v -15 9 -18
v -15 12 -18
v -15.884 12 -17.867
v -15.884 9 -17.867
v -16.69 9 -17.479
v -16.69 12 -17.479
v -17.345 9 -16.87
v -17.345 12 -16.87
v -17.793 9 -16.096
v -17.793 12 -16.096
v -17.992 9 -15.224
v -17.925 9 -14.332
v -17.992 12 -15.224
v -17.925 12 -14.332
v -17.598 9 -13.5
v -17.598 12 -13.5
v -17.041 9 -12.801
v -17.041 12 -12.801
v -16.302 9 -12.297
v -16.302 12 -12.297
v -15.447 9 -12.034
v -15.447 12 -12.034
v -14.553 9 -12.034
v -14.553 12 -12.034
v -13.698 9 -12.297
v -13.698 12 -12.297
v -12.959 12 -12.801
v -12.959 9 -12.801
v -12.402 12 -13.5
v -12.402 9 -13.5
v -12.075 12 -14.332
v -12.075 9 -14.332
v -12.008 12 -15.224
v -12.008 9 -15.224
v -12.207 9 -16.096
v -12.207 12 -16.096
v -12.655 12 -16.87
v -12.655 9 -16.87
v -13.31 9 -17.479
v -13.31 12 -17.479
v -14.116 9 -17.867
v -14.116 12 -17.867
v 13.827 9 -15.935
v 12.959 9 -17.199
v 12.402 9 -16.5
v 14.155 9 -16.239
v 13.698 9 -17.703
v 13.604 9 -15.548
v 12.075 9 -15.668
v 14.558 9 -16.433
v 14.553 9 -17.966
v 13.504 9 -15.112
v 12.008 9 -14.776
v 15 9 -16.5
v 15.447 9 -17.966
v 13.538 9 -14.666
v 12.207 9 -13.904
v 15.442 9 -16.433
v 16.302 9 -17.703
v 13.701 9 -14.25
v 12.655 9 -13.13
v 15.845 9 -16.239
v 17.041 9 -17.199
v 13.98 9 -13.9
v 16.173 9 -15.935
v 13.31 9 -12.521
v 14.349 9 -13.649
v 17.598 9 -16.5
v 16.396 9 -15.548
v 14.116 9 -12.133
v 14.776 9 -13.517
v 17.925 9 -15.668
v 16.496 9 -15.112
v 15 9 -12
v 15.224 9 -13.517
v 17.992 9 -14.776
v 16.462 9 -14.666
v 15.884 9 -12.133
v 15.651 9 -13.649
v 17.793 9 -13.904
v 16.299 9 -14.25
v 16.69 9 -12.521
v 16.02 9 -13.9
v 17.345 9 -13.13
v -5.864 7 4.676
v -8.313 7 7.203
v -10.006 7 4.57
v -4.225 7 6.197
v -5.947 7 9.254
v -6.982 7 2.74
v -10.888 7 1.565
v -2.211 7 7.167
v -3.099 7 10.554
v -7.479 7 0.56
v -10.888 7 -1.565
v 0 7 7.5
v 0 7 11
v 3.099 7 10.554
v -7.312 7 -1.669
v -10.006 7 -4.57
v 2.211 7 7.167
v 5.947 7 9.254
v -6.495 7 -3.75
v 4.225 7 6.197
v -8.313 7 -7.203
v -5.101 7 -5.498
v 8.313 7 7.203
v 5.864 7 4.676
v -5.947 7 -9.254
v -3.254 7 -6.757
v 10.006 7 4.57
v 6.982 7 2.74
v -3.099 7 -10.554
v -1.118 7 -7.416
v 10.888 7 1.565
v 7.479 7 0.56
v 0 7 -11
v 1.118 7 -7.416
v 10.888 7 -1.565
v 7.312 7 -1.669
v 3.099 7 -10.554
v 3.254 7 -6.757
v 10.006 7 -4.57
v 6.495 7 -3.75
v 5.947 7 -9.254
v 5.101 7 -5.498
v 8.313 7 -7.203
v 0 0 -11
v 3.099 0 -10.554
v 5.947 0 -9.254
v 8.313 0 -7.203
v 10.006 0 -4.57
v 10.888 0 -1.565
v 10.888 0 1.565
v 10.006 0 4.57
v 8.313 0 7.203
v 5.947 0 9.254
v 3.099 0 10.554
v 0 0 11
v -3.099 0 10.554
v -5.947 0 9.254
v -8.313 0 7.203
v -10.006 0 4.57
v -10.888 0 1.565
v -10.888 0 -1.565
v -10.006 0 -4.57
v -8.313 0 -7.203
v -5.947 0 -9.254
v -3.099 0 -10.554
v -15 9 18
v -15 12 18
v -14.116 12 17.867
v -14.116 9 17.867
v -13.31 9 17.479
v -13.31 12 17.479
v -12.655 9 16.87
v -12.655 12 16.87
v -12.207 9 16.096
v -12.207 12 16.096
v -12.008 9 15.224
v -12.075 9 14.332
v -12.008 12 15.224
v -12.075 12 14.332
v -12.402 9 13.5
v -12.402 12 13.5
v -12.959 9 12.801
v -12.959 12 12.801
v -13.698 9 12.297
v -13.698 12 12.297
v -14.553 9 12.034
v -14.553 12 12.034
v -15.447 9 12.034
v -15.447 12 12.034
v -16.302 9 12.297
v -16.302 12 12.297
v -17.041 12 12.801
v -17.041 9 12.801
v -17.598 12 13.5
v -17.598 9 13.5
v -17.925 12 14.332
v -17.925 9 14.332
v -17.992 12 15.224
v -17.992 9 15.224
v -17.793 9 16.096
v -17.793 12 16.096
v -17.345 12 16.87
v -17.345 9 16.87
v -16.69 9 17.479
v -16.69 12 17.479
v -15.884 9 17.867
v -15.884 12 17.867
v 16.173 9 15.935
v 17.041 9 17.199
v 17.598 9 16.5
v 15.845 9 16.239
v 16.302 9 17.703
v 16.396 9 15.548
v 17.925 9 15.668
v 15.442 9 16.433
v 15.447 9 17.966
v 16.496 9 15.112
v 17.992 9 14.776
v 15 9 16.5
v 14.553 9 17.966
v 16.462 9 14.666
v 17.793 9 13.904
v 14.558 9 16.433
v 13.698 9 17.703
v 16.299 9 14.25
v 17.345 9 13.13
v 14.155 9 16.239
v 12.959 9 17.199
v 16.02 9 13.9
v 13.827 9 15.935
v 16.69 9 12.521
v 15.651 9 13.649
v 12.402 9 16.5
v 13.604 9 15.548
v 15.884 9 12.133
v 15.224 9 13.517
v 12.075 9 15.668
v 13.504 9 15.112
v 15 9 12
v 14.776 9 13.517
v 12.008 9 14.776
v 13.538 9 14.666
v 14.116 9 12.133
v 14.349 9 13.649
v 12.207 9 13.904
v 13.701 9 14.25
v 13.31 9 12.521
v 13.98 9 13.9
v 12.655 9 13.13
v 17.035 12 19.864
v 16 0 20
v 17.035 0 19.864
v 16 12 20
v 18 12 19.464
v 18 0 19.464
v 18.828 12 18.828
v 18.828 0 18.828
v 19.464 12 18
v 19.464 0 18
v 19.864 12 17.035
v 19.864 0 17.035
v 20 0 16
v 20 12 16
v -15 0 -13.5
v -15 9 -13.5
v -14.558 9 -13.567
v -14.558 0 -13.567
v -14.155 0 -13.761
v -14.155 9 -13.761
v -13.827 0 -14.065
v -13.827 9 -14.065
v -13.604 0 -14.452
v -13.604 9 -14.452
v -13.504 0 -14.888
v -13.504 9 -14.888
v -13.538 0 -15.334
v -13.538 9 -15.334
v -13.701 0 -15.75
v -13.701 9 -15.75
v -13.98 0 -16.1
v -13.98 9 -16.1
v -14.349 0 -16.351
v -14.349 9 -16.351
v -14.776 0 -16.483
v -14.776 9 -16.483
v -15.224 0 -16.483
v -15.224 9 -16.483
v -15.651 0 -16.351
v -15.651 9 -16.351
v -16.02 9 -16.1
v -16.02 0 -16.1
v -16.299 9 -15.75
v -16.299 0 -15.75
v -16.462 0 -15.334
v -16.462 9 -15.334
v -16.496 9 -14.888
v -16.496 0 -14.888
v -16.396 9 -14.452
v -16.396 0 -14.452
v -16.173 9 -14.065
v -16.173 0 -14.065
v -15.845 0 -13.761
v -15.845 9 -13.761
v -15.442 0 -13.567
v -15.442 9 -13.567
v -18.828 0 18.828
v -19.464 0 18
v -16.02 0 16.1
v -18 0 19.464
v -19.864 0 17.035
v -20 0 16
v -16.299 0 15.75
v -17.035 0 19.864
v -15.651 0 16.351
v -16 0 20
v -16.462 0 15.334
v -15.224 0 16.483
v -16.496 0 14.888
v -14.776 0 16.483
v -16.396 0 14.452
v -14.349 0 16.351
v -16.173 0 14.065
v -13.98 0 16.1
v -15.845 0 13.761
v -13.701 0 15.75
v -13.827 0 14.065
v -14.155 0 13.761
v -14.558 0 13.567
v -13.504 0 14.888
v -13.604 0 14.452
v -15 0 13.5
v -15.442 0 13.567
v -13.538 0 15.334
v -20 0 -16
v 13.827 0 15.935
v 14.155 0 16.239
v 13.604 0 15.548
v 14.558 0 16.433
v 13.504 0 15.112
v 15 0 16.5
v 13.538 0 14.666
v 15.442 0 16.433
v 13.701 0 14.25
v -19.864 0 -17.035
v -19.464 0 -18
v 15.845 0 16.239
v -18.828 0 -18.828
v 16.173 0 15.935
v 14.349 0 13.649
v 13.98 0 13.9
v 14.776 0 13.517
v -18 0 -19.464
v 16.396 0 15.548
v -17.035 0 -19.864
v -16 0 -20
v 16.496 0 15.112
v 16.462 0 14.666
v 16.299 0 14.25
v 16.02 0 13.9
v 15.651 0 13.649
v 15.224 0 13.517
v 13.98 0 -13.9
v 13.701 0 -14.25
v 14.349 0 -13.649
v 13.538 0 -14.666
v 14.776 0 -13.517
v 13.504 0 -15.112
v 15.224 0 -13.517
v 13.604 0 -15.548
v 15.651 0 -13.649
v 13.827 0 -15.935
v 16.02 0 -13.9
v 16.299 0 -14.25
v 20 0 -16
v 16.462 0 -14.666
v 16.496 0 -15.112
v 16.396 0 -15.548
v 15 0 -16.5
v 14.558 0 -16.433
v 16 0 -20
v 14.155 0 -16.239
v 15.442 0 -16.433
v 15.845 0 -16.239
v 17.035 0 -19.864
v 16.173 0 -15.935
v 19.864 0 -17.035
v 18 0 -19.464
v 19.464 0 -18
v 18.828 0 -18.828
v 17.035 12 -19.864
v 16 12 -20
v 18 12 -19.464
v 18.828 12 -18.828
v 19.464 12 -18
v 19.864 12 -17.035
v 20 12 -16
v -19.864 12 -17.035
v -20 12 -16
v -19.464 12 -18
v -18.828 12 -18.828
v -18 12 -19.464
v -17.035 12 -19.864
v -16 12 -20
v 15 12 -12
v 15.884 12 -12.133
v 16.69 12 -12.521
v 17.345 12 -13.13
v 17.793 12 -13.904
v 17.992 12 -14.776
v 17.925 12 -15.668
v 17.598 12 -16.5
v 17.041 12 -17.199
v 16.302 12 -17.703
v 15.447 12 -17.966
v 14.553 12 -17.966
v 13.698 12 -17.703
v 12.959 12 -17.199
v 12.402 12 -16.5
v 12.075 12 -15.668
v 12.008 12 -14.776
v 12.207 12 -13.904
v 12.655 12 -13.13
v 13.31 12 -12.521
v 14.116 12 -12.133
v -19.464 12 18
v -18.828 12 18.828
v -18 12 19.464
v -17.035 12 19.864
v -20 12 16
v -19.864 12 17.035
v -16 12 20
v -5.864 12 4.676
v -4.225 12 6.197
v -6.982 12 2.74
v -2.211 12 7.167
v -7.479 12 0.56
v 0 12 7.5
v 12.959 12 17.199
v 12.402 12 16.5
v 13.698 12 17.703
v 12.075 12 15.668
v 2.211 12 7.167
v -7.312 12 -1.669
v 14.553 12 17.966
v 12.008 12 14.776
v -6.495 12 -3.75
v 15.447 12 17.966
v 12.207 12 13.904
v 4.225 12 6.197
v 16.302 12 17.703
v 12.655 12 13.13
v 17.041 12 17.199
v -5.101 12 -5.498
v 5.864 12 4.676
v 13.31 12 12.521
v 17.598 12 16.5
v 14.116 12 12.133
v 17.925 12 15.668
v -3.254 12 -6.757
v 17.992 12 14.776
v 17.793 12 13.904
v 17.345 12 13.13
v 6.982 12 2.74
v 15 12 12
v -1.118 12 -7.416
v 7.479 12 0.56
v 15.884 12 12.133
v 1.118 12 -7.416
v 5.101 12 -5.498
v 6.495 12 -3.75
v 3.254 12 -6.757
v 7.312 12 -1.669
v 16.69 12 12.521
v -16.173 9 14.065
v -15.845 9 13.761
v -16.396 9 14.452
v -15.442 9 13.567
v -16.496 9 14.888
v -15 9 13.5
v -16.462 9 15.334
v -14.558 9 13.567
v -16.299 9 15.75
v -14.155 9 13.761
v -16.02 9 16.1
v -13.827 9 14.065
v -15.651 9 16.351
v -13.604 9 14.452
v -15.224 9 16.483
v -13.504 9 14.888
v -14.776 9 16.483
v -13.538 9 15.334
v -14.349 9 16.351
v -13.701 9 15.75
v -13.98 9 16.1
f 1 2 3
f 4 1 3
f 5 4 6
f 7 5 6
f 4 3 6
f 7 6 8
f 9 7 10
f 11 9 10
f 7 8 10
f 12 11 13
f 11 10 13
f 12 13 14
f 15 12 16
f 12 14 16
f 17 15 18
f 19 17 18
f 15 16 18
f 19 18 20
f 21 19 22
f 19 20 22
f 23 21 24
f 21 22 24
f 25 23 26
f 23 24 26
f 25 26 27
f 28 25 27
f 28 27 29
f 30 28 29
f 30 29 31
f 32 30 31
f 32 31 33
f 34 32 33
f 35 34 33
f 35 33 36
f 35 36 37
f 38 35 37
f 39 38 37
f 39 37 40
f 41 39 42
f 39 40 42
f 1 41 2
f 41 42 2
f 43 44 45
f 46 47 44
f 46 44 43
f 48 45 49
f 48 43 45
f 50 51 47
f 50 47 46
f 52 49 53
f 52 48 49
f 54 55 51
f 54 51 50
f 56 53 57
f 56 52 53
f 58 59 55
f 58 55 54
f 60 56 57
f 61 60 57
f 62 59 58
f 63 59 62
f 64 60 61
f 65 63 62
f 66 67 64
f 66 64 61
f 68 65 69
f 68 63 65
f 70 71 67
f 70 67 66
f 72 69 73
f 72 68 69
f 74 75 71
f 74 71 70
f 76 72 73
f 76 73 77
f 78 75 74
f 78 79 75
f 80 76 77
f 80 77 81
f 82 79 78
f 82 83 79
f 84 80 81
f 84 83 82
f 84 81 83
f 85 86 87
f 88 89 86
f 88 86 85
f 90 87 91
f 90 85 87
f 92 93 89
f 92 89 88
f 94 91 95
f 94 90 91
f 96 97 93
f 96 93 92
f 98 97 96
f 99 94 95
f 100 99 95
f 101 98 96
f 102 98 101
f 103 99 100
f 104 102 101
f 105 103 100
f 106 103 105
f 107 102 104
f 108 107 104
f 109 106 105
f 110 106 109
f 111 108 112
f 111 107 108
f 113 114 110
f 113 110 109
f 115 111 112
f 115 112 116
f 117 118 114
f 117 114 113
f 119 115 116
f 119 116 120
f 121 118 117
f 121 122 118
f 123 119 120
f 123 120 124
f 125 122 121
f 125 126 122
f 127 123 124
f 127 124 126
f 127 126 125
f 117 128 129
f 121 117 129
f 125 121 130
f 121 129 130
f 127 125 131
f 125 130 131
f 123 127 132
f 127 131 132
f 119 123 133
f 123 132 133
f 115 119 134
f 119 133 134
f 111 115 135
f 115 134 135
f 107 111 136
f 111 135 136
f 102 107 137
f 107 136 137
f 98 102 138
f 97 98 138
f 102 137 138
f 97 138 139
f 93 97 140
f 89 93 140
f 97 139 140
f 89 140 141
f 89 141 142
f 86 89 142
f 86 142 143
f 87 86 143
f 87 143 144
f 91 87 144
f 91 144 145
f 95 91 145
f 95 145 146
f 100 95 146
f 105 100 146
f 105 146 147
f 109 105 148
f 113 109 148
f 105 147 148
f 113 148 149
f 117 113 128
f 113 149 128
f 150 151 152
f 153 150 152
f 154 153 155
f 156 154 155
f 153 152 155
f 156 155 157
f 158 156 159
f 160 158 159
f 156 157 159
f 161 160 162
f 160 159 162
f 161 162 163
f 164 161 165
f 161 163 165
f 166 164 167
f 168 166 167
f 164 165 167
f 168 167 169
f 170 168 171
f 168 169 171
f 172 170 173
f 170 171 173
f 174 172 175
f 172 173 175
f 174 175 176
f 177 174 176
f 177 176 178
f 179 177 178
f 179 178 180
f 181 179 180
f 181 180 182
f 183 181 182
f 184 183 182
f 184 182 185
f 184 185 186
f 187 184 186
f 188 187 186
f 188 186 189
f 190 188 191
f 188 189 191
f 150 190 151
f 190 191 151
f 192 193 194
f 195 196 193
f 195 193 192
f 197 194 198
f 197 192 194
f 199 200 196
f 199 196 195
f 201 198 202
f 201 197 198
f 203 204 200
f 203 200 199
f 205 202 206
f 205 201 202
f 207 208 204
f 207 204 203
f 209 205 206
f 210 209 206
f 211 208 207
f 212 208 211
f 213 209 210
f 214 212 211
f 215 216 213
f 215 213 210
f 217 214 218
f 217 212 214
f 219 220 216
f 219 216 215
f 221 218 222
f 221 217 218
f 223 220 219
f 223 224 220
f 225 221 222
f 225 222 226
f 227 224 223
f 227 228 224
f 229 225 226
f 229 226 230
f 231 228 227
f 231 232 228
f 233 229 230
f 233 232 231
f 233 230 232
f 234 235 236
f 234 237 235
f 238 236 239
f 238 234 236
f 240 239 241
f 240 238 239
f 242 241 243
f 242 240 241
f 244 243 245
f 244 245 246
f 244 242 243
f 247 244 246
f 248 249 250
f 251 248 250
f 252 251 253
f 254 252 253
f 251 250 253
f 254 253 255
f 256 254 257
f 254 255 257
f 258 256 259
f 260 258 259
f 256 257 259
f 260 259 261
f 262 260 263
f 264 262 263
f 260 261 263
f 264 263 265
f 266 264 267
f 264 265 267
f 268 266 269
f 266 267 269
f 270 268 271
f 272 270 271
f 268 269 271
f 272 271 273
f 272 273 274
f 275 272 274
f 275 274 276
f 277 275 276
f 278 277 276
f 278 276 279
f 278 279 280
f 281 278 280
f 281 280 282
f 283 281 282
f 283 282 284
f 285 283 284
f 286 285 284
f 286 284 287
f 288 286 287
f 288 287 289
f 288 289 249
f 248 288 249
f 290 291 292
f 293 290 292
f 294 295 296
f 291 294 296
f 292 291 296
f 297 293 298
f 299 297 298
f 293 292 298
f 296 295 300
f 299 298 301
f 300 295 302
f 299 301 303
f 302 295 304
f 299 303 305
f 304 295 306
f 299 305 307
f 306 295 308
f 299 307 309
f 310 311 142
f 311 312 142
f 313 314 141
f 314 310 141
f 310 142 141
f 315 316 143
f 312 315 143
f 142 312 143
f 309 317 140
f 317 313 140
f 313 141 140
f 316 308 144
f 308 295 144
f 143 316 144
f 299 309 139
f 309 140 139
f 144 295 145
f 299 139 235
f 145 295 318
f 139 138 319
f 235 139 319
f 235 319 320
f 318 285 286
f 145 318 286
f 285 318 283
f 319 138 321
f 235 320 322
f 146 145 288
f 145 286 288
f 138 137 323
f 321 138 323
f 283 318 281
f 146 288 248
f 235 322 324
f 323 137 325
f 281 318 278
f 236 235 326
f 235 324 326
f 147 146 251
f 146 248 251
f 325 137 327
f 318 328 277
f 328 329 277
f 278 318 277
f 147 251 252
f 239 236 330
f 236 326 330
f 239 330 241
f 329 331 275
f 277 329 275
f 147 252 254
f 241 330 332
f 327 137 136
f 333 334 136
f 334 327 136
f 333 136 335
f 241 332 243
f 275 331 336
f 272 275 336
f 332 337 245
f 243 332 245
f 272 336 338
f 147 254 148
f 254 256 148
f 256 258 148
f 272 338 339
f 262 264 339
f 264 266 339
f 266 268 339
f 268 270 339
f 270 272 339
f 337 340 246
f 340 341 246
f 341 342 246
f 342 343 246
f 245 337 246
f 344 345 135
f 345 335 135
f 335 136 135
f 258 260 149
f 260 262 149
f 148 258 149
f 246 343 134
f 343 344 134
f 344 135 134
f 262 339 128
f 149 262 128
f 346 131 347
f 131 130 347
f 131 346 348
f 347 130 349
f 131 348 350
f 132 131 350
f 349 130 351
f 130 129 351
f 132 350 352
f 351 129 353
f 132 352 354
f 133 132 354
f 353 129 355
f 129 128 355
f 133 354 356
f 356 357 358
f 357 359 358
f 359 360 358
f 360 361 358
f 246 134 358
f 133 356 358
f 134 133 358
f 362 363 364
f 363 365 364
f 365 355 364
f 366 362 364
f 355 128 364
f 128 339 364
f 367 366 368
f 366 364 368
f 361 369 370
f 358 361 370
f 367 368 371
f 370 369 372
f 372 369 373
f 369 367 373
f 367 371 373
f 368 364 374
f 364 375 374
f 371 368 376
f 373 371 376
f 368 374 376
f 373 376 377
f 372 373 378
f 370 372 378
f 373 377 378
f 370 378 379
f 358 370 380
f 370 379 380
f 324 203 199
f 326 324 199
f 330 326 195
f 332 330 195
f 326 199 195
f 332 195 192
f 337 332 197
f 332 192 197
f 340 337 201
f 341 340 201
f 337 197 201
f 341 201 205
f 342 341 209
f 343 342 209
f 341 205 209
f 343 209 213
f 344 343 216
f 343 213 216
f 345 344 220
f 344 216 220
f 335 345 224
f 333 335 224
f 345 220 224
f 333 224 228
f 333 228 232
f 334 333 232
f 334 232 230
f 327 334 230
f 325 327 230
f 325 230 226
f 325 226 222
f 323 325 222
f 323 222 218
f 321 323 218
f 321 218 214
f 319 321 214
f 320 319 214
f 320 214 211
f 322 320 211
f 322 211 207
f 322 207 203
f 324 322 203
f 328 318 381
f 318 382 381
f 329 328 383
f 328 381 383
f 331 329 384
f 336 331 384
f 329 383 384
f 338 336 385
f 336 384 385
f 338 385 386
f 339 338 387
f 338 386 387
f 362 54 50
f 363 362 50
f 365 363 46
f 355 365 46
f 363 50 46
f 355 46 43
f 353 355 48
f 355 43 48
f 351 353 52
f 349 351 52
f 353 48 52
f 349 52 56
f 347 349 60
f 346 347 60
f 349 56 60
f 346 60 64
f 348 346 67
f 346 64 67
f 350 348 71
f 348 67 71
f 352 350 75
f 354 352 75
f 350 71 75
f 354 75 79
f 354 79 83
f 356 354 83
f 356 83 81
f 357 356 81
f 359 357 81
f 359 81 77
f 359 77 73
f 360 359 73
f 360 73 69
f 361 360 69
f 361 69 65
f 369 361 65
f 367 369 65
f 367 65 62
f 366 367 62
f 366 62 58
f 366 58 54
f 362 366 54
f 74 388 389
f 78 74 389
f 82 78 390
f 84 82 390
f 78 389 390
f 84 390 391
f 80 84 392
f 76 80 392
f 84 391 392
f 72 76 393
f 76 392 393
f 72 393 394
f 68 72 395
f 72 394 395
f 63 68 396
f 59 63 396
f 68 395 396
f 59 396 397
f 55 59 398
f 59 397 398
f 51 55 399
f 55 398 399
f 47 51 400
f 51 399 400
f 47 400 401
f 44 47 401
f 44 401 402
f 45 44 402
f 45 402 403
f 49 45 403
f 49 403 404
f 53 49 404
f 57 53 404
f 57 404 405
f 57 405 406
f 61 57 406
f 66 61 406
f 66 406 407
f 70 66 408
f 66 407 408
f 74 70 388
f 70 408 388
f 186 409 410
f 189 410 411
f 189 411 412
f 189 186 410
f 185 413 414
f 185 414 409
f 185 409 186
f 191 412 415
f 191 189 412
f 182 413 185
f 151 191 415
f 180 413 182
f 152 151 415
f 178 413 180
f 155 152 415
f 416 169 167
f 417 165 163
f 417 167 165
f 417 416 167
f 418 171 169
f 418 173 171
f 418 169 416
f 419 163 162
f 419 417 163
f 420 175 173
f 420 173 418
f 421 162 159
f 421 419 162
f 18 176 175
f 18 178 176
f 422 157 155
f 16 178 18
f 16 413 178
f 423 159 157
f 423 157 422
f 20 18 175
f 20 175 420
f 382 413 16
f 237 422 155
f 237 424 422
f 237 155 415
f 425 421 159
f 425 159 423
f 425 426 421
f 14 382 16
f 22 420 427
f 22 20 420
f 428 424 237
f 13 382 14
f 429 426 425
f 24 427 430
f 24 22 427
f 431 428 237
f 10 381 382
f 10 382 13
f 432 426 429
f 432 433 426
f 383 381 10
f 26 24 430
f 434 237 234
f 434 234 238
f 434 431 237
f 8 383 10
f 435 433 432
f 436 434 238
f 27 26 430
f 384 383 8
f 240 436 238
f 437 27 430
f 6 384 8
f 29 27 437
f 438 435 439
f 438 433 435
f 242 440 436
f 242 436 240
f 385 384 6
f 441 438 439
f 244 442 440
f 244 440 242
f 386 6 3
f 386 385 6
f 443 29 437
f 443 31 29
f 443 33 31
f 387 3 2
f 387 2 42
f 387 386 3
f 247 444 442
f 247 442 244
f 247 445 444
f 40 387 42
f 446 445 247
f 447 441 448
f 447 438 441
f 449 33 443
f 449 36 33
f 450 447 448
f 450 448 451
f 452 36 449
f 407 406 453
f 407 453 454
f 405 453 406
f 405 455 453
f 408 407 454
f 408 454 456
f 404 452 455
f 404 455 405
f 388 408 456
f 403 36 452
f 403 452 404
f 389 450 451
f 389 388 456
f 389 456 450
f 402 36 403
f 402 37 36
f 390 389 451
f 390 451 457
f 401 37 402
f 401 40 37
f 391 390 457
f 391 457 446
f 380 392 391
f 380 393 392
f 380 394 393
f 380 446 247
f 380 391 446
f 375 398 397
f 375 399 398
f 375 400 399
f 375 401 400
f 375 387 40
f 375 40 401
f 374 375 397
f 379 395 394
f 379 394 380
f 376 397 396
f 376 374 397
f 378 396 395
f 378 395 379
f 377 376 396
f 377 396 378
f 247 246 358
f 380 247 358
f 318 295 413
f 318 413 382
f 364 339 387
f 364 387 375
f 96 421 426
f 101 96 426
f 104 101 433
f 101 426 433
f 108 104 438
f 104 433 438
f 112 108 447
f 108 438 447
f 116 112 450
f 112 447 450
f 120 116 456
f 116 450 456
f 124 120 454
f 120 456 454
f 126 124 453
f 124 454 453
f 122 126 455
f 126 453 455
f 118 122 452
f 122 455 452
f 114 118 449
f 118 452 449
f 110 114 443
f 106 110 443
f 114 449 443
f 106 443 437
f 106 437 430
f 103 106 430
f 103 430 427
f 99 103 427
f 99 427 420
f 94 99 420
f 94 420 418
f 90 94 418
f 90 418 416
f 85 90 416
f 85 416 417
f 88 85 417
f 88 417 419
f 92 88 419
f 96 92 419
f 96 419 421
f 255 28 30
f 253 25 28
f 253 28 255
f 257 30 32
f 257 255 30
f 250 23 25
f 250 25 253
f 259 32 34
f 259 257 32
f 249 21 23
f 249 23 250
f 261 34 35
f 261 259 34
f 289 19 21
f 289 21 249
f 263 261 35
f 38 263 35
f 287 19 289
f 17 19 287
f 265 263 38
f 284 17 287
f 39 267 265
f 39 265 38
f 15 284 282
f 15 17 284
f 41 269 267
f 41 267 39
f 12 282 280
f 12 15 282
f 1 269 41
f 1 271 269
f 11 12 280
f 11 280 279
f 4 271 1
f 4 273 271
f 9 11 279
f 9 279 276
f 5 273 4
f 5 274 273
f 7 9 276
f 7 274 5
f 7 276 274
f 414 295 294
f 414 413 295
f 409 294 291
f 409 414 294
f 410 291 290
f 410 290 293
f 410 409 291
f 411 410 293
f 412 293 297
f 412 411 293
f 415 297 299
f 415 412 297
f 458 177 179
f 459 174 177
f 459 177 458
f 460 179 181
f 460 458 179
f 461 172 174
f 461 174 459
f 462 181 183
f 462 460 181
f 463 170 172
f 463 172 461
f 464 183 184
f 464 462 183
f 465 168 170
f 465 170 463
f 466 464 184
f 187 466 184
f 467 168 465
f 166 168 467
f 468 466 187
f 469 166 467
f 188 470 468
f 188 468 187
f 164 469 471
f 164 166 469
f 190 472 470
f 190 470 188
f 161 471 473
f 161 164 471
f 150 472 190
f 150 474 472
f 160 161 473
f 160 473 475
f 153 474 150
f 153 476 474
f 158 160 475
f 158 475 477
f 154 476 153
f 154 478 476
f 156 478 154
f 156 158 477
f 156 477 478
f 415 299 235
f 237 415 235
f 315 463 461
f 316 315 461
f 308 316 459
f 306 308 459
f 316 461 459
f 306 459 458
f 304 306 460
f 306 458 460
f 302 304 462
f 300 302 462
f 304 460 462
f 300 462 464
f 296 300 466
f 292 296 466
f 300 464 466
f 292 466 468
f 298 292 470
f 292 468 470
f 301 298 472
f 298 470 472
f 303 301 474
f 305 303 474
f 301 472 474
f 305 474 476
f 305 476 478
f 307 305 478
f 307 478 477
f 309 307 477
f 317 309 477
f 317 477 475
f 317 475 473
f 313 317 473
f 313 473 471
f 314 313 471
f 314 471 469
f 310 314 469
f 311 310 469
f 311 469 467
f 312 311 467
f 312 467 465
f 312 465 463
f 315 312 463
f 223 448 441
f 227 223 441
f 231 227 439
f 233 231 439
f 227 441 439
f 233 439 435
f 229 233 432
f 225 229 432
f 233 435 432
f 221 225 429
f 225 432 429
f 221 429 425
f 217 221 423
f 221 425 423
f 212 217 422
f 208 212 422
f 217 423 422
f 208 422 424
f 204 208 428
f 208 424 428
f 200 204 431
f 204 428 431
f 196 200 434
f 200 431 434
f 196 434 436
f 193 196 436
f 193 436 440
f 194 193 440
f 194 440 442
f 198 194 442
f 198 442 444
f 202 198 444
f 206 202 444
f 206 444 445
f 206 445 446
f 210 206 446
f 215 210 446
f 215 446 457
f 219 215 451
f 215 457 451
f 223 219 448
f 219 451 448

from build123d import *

# Parameters (mm, degrees)
SKETCH1_W           = 40
SKETCH1_H           = 40
BOSS_EXTRUDE1_DEPTH = 12
SKETCH2_R           = 11
CUT_EXTRUDE1_DEPTH  = 7
SKETCH3_R           = 7.5
CUT_EXTRUDE2_DEPTH  = 31.724582991
FILLET1_R           = 4
SKETCH4_R           = 1.5
CUT_EXTRUDE3_DEPTH  = 31.724582991
SKETCH5_R           = 3
CUT_EXTRUDE4_DEPTH  = 3


with BuildPart() as part:
    # Sketch1 → Boss-Extrude1 (new body)
    with BuildSketch(Plane(origin=(0, 0, 0), x_dir=(1, 0, 0), z_dir=(0, 1, 0))):
        Rectangle(SKETCH1_W, SKETCH1_H)
    extrude(amount=BOSS_EXTRUDE1_DEPTH)

    # Sketch2 → Cut-Extrude1 (cut)
    with BuildSketch(Plane.XZ):
        with Locations(Location((0, 0, 0), (0, 0, 270))):
            Circle(SKETCH2_R)
    extrude(amount=-CUT_EXTRUDE1_DEPTH, mode=Mode.SUBTRACT)

    # Sketch3 → Cut-Extrude2 (cut, through all)
    with BuildSketch(Plane(origin=(0, 12, 0), x_dir=(1, 0, 0), z_dir=(0, 1, 0))):
        with Locations(Location((0, 0, 0), (0, 0, 270))):
            Circle(SKETCH3_R)
    extrude(amount=-CUT_EXTRUDE2_DEPTH, mode=Mode.SUBTRACT)

    # Fillet1
    fillet1_edges = [part.edges().sort_by_distance(p)[0] for p in [
        (20, 6, 20),
        (-20, 6, 20),
        (-20, 6, -20),
        (20, 6, -20),
    ]]
    fillet(fillet1_edges, radius=FILLET1_R)

    # Sketch4 → Cut-Extrude3 (cut, through all)
    with BuildSketch(Plane(origin=(0, 12, 0), x_dir=(1, 0, 0), z_dir=(0, 1, 0))):
        with Locations(Location((-15, 15, 0), (0, 0, 270))):
            Circle(SKETCH4_R)
        with Locations(Location((15, 15, 0), (0, 0, 90))):
            Circle(SKETCH4_R)
        with Locations(Location((15, -15, 0), (0, 0, 270))):
            Circle(SKETCH4_R)
        with Locations(Location((-15, -15, 0), (0, 0, 90))):
            Circle(SKETCH4_R)
    extrude(amount=-CUT_EXTRUDE3_DEPTH, mode=Mode.SUBTRACT)

    # Sketch5 → Cut-Extrude4 (cut)
    with BuildSketch(Plane(origin=(0, 12, 0), x_dir=(1, 0, 0), z_dir=(0, 1, 0))):
        with Locations(Location((-15, -15, 0), (0, 0, 270))):
            Circle(SKETCH5_R)
        with Locations(Location((-15, 15, 0), (0, 0, 90))):
            Circle(SKETCH5_R)
        with Locations(Location((15, -15, 0), (0, 0, 90))):
            Circle(SKETCH5_R)
        with Locations(Location((15, 15, 0), (0, 0, 270))):
            Circle(SKETCH5_R)
    extrude(amount=-CUT_EXTRUDE4_DEPTH, mode=Mode.SUBTRACT)


solid = part.part
